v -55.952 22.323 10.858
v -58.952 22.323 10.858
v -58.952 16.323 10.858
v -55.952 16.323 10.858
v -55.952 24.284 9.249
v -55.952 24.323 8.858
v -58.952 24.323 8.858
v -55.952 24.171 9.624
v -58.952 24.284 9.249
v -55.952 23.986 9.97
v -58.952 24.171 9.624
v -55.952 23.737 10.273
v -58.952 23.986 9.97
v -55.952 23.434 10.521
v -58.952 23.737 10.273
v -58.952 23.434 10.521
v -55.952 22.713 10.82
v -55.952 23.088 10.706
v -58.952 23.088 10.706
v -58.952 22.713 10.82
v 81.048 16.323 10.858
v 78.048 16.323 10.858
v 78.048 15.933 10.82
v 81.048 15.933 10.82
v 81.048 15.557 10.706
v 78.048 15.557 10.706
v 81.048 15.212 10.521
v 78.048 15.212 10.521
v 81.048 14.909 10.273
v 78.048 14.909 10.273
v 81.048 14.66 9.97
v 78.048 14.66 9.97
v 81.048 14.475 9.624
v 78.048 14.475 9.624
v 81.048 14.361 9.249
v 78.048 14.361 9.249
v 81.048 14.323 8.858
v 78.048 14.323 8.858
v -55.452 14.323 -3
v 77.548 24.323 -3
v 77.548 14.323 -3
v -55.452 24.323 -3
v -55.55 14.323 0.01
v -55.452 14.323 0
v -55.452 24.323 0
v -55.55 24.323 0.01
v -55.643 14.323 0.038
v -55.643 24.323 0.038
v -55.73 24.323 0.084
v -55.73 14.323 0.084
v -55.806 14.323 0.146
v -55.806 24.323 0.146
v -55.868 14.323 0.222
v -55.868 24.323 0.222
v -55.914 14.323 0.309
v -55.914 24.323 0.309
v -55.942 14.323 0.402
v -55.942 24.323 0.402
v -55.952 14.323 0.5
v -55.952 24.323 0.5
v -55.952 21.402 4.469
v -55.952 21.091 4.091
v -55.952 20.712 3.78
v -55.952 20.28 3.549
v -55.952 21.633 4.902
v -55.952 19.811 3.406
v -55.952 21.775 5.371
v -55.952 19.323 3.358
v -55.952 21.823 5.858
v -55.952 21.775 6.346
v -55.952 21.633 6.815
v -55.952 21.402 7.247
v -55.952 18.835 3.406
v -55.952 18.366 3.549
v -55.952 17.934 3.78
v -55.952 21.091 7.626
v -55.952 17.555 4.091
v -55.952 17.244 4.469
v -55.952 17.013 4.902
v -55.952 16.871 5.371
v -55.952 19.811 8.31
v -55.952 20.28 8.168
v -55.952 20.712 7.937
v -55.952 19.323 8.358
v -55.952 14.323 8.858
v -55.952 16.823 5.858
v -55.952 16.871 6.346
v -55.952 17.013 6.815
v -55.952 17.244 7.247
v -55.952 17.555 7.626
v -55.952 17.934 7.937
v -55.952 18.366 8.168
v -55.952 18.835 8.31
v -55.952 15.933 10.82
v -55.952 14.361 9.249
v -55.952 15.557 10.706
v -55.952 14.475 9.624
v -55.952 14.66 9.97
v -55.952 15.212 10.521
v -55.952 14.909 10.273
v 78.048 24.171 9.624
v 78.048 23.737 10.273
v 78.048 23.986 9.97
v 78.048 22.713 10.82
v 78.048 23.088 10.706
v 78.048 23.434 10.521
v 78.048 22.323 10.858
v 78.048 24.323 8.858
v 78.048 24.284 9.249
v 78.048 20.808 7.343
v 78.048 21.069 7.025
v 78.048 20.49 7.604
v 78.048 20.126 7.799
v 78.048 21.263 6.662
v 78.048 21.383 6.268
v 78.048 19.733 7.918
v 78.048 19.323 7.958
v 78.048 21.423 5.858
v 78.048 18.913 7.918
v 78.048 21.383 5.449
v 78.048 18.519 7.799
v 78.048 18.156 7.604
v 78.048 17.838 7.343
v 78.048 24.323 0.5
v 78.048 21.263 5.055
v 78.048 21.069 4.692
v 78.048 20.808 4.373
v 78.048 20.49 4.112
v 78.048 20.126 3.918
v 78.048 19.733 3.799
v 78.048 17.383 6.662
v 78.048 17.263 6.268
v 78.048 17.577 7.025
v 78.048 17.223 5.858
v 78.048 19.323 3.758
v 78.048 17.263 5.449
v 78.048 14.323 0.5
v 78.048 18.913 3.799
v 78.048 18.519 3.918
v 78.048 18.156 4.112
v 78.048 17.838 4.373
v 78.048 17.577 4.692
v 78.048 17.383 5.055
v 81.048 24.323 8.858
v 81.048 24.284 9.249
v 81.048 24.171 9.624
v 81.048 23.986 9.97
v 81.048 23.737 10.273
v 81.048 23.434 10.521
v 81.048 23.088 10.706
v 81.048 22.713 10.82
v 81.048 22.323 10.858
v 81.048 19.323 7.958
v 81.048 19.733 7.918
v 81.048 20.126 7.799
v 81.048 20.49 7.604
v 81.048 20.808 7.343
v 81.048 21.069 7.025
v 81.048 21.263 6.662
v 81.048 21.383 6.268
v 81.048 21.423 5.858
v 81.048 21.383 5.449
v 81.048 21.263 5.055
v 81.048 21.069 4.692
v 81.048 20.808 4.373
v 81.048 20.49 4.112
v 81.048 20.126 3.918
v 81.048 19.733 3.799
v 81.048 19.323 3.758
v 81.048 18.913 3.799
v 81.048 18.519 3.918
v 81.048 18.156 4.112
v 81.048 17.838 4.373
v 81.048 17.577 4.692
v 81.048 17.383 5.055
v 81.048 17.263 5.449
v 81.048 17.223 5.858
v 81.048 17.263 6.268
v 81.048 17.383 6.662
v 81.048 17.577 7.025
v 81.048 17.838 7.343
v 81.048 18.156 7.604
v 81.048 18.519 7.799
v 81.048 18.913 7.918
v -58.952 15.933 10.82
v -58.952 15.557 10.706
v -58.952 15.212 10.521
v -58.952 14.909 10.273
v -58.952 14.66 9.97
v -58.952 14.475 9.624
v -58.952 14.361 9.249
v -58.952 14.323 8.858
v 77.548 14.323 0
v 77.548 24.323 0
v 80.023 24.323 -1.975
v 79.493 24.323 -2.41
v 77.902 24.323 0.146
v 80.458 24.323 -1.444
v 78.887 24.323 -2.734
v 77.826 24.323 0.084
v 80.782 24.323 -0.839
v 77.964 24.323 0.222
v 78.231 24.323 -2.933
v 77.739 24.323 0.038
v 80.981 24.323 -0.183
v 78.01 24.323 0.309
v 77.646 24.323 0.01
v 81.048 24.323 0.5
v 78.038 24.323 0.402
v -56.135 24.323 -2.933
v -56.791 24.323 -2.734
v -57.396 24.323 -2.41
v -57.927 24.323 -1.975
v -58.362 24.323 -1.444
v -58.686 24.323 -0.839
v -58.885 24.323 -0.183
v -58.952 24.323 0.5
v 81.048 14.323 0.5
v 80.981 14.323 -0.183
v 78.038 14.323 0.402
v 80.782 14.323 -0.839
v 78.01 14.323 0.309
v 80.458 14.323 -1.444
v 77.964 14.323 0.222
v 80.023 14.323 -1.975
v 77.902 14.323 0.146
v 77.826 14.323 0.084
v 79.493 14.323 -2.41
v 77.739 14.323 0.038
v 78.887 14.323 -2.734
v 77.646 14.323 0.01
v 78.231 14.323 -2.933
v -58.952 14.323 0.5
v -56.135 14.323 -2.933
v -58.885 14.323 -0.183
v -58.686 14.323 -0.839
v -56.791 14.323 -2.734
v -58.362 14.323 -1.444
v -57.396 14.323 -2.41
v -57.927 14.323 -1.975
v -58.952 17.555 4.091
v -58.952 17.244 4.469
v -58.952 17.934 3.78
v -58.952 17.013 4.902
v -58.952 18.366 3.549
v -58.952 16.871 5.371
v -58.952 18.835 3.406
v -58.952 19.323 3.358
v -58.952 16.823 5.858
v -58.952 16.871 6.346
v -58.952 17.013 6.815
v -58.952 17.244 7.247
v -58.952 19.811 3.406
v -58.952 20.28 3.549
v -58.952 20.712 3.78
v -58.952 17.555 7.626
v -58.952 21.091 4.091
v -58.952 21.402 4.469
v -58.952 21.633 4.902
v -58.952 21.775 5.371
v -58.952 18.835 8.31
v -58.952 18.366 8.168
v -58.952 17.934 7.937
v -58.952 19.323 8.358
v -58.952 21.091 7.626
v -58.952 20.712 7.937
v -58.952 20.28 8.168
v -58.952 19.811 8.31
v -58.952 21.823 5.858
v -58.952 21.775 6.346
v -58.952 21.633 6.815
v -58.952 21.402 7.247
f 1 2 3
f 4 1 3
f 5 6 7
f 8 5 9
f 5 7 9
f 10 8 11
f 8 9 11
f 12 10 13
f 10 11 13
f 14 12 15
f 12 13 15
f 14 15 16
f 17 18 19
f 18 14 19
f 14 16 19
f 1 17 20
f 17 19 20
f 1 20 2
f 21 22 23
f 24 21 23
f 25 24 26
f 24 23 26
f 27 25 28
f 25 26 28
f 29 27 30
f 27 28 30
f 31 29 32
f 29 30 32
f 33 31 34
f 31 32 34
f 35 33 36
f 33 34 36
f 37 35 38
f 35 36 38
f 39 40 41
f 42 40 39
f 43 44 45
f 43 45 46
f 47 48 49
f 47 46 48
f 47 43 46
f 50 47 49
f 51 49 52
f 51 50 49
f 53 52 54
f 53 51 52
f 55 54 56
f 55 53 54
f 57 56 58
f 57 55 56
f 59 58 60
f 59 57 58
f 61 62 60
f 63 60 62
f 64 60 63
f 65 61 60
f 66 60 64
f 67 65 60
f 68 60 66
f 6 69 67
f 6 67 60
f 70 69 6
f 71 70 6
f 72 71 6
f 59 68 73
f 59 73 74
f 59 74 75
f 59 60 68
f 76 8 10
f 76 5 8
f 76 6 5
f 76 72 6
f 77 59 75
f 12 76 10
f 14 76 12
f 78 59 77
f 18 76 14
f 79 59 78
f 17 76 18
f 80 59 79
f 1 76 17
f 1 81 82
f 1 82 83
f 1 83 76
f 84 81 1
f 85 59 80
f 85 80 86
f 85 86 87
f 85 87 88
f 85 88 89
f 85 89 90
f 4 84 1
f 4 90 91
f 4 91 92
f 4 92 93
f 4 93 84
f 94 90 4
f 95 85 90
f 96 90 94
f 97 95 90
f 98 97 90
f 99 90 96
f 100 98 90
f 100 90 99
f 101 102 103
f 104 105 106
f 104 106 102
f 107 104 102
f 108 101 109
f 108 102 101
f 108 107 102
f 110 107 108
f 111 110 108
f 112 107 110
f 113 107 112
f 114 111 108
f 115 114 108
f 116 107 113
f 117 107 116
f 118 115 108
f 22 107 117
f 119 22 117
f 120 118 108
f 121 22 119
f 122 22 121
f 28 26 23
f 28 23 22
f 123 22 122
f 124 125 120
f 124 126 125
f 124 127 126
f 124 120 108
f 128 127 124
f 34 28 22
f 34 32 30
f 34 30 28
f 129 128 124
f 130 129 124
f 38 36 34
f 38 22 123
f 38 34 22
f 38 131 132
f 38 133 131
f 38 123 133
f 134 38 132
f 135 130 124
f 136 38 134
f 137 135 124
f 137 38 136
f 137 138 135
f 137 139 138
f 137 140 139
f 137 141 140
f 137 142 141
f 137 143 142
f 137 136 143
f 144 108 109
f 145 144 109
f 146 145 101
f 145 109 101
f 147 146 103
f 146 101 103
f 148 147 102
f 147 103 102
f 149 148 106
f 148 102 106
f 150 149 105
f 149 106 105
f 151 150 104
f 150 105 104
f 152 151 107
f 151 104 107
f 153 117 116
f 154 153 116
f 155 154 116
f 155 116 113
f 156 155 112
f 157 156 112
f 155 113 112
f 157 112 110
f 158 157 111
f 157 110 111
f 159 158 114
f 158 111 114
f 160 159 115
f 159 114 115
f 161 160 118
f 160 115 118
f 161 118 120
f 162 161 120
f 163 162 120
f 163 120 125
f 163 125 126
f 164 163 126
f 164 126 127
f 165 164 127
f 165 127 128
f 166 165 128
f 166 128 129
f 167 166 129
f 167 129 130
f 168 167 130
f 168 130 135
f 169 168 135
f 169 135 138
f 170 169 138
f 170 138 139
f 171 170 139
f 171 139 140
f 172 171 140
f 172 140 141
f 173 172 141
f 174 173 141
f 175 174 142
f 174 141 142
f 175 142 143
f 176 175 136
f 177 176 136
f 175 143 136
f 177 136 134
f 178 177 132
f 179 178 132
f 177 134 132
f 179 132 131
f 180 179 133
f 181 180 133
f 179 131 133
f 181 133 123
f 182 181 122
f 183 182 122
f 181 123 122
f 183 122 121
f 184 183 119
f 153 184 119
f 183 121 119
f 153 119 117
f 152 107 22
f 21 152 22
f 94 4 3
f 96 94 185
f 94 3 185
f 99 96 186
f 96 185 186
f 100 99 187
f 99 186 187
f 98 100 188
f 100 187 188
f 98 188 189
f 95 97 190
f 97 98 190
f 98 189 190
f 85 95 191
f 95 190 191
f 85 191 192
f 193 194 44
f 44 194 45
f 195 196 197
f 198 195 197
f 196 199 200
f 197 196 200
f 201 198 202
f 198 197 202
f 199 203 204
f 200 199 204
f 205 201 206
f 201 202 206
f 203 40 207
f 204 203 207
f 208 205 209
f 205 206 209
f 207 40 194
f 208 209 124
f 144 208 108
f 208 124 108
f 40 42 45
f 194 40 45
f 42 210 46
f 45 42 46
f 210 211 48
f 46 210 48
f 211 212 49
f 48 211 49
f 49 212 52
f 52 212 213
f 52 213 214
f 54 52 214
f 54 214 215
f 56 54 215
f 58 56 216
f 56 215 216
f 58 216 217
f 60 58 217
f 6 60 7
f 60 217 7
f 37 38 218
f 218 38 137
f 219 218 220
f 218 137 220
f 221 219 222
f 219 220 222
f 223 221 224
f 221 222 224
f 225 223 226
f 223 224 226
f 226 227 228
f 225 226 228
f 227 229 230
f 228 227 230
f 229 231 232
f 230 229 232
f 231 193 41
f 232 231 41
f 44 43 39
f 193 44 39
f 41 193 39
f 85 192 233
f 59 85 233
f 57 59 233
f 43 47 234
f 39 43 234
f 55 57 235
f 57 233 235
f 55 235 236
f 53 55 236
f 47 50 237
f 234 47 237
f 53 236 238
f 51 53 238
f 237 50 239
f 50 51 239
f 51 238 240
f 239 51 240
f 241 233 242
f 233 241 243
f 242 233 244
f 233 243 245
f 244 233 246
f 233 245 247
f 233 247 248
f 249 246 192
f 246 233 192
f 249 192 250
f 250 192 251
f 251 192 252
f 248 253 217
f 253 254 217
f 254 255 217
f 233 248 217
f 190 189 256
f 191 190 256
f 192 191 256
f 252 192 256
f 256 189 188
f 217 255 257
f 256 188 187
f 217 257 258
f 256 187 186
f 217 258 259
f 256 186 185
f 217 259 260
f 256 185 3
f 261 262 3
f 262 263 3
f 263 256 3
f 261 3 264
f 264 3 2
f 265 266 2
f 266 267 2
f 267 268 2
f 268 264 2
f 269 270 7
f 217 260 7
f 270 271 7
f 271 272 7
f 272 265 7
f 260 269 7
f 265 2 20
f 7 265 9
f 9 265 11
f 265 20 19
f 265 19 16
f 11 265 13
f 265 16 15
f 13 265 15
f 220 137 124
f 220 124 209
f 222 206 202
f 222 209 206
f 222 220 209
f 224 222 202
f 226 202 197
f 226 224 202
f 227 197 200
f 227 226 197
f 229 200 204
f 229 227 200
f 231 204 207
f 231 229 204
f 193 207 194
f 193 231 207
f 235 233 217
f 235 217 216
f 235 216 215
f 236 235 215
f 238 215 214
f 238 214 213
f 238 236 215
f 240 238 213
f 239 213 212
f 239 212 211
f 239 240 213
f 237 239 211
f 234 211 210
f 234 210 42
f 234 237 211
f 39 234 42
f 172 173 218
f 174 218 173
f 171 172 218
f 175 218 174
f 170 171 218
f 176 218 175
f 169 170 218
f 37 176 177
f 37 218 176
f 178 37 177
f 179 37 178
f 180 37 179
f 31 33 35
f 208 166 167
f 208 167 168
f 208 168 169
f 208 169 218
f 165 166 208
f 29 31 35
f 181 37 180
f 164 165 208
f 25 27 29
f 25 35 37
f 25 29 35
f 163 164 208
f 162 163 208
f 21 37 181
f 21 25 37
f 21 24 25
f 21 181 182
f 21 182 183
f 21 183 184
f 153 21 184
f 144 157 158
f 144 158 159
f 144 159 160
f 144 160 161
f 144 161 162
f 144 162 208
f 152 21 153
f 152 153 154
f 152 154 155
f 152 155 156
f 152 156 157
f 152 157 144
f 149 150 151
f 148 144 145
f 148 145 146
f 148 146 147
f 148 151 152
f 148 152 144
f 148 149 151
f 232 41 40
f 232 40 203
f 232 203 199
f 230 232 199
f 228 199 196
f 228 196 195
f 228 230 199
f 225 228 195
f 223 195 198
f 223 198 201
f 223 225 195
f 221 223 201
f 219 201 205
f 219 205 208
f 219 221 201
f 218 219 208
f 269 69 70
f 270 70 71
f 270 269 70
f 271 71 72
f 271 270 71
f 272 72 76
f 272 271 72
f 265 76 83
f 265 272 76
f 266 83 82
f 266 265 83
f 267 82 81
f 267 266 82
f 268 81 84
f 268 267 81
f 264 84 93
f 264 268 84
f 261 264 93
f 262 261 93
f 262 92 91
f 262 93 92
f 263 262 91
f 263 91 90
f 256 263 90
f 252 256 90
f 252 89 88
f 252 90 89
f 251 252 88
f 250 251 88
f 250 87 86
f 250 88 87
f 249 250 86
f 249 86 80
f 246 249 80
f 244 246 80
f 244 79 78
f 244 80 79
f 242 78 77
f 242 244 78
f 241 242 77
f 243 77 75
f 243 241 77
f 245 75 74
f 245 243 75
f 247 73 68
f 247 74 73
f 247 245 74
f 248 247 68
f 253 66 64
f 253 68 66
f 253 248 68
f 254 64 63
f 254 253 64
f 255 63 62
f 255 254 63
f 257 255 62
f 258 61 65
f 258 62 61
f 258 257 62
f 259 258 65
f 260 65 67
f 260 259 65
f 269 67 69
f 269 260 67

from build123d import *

# Parameters (mm, degrees)
SKETCH_1_R             = 2.5
SKETCH_1_R_2           = 2
SM_BASE_FLANGE_1_DEPTH = 3
OTHER_START            = 78.048031103
OTHER_1_OUTLINE_R      = 2.5
OTHER_1_OUTLINE_R_2    = 2
OTHER_1_DEPTH          = 3
OTHER_START_2          = -68.951968897
OTHER_1_2_OUTLINE_W    = 10
OTHER_1_2_OUTLINE_H    = 3
OTHER_1_2_DEPTH        = 10
OTHER_START_3          = 81.048031103
OTHER_1_3_OUTLINE_W    = 10
OTHER_1_3_OUTLINE_H    = 3
OTHER_1_3_DEPTH        = 10
OTHER_START_4          = -58.951968897
OTHER_1_4_OUTLINE_R    = 2.5
OTHER_1_4_DEPTH        = 3.5
OTHER_START_5          = 77.548031103
OTHER_1_5_OUTLINE_R    = 2.5
OTHER_1_5_DEPTH        = 3.5
OTHER_START_6          = 13
OTHER_1_6_DEPTH        = 12
HOLE_WIZARD_M5_1_D     = 4.2


with BuildPart() as part:
    # 基体-法兰1: sheet metal written as solids
    # Sketch 1 → 基体-法兰1 (new body)
    with BuildSketch(Plane.XY):
        with BuildLine():
            Line((-66.951968897, 24.322862815), (89.048031103, 24.322862815))
            ThreePointArc((89.048031103, 24.322862815), (90.462244666, 23.737076377), (91.048031103, 22.322862815))
            Line((91.048031103, 22.322862815), (91.048031103, 16.322862815))
            ThreePointArc((91.048031103, 16.322862815), (90.462244666, 14.908649252), (89.048031103, 14.322862815))
            Line((89.048031103, 14.322862815), (-66.951968897, 14.322862815))
            ThreePointArc((-66.951968897, 14.322862815), (-68.366182459, 14.908649252), (-68.951968897, 16.322862815))
            Line((-68.951968897, 16.322862815), (-68.951968897, 22.322862815))
            ThreePointArc((-68.951968897, 22.322862815), (-68.366182459, 23.737076377), (-66.951968897, 24.322862815))
        make_face()
        with Locations((-63.951968897, 19.322862815)):
            Circle(SKETCH_1_R, mode=Mode.SUBTRACT)
        with Locations((86.048031103, 19.322862815)):
            Circle(SKETCH_1_R_2, mode=Mode.SUBTRACT)
    extrude(amount=-SM_BASE_FLANGE_1_DEPTH)

    # Other 1 2 outline → Other 1 2 (cut)
    with BuildSketch(Plane.YZ.offset(OTHER_START_2)):
        with Locations((19.322862815, -1.5)):
            Rectangle(OTHER_1_2_OUTLINE_W, OTHER_1_2_OUTLINE_H)
    extrude(amount=OTHER_1_2_DEPTH, mode=Mode.SUBTRACT)

    # Other 1 3 outline → Other 1 3 (cut)
    with BuildSketch(Plane.YZ.offset(OTHER_START_3)):
        with Locations((19.322862815, -1.5)):
            Rectangle(OTHER_1_3_OUTLINE_W, OTHER_1_3_OUTLINE_H)
    extrude(amount=OTHER_1_3_DEPTH, mode=Mode.SUBTRACT)

    # Other 1 4 outline → Other 1 4 (add)
    with BuildSketch(Plane.YZ.offset(OTHER_START_4)):
        with BuildLine():
            Line((14.322862815, 0), (24.322862815, 0))
            Line((24.322862815, 0), (24.322862815, 8.858407346))
            ThreePointArc((24.322862815, 8.858407346), (23.737076378, 10.272620909), (22.322862815, 10.858407346))
            Line((22.322862815, 10.858407346), (16.322862815, 10.858407346))
            ThreePointArc((16.322862815, 10.858407346), (14.908649252, 10.272620909), (14.322862815, 8.858407346))
            Line((14.322862815, 8.858407346), (14.322862815, 0))
        make_face()
        with Locations((19.322862815, 5.858407346)):
            Circle(OTHER_1_4_OUTLINE_R, mode=Mode.SUBTRACT)
    extrude(amount=OTHER_1_4_DEPTH)



with BuildPart() as body_2:
    # Other 1: read off the stored shape, not the designer's step
    # Other 1 outline → Other 1 (new body)
    with BuildSketch(Plane.YZ.offset(OTHER_START)):
        with Locations((19.322862815, 5.858407346)):
            Circle(OTHER_1_OUTLINE_R)
        with Locations((19.322862815, 5.858407346)):
            Circle(OTHER_1_OUTLINE_R_2, mode=Mode.SUBTRACT)
    extrude(amount=OTHER_1_DEPTH)


with BuildPart() as part_1:
    add(part.part)

    add(body_2.part)  # Other 1 5 merges body 2
    # Other 1 5 outline → Other 1 5 (add)
    with BuildSketch(Plane.YZ.offset(OTHER_START_5)):
        with BuildLine():
            Line((14.322862815, 0), (24.322862815, 0))
            Line((24.322862815, 0), (24.322862815, 8.858407346))
            ThreePointArc((24.322862815, 8.858407346), (23.737076378, 10.272620909), (22.322862815, 10.858407346))
            Line((22.322862815, 10.858407346), (16.322862815, 10.858407346))
            ThreePointArc((16.322862815, 10.858407346), (14.908649252, 10.272620909), (14.322862815, 8.858407346))
            Line((14.322862815, 8.858407346), (14.322862815, 0))
        make_face()
        with Locations((19.322862815, 5.858407346)):
            Circle(OTHER_1_5_OUTLINE_R, mode=Mode.SUBTRACT)
    extrude(amount=OTHER_1_5_DEPTH)

    # Other 1 6 outline → Other 1 6 (cut)
    with BuildSketch(Plane(origin=(0, 0, 0), x_dir=(1, 0, 0), z_dir=(0, 1, 0)).offset(OTHER_START_6)):
        with BuildLine():
            Line((-55.951968897, -0.5), (-55.951968897, -10.858407346))
            Line((-55.951968897, -10.858407346), (-55.451968897, -10.858407346))
            Line((-55.451968897, -10.858407346), (-55.451968897, 0))
            ThreePointArc((-55.451968897, 0), (-55.805522288, -0.146446609), (-55.951968897, -0.5))
        make_face()
        with BuildLine():
            Line((77.548031103, -10.858407346), (78.048031103, -10.858407346))
            Line((78.048031103, -10.858407346), (78.048031103, -0.5))
            ThreePointArc((78.048031103, -0.5), (77.901584494, -0.146446609), (77.548031103, 0))
            Line((77.548031103, 0), (77.548031103, -10.858407346))
        make_face()
        with BuildLine():
            Line((81.048031103, 3), (77.548031103, 3))
            ThreePointArc((77.548031103, 3), (80.022904837, 1.974873734), (81.048031103, -0.5))
            Line((81.048031103, -0.5), (81.048031103, 3))
        make_face()
        with BuildLine():
            ThreePointArc((-58.951968897, -0.5), (-57.926842631, 1.974873734), (-55.451968897, 3))
            Line((-55.451968897, 3), (-58.951968897, 3))
            Line((-58.951968897, 3), (-58.951968897, -0.5))
        make_face()
    extrude(amount=OTHER_1_6_DEPTH, mode=Mode.SUBTRACT)

    # M5 螺纹孔1 (through all)
    with Locations(Plane(origin=(81.048031103, 0, 0), x_dir=(0, 0, -1), z_dir=(1, 0, 0))):
        with Locations((-5.858407346, 19.322862815)):
            Hole(HOLE_WIZARD_M5_1_D / 2)


solid = part_1.part
